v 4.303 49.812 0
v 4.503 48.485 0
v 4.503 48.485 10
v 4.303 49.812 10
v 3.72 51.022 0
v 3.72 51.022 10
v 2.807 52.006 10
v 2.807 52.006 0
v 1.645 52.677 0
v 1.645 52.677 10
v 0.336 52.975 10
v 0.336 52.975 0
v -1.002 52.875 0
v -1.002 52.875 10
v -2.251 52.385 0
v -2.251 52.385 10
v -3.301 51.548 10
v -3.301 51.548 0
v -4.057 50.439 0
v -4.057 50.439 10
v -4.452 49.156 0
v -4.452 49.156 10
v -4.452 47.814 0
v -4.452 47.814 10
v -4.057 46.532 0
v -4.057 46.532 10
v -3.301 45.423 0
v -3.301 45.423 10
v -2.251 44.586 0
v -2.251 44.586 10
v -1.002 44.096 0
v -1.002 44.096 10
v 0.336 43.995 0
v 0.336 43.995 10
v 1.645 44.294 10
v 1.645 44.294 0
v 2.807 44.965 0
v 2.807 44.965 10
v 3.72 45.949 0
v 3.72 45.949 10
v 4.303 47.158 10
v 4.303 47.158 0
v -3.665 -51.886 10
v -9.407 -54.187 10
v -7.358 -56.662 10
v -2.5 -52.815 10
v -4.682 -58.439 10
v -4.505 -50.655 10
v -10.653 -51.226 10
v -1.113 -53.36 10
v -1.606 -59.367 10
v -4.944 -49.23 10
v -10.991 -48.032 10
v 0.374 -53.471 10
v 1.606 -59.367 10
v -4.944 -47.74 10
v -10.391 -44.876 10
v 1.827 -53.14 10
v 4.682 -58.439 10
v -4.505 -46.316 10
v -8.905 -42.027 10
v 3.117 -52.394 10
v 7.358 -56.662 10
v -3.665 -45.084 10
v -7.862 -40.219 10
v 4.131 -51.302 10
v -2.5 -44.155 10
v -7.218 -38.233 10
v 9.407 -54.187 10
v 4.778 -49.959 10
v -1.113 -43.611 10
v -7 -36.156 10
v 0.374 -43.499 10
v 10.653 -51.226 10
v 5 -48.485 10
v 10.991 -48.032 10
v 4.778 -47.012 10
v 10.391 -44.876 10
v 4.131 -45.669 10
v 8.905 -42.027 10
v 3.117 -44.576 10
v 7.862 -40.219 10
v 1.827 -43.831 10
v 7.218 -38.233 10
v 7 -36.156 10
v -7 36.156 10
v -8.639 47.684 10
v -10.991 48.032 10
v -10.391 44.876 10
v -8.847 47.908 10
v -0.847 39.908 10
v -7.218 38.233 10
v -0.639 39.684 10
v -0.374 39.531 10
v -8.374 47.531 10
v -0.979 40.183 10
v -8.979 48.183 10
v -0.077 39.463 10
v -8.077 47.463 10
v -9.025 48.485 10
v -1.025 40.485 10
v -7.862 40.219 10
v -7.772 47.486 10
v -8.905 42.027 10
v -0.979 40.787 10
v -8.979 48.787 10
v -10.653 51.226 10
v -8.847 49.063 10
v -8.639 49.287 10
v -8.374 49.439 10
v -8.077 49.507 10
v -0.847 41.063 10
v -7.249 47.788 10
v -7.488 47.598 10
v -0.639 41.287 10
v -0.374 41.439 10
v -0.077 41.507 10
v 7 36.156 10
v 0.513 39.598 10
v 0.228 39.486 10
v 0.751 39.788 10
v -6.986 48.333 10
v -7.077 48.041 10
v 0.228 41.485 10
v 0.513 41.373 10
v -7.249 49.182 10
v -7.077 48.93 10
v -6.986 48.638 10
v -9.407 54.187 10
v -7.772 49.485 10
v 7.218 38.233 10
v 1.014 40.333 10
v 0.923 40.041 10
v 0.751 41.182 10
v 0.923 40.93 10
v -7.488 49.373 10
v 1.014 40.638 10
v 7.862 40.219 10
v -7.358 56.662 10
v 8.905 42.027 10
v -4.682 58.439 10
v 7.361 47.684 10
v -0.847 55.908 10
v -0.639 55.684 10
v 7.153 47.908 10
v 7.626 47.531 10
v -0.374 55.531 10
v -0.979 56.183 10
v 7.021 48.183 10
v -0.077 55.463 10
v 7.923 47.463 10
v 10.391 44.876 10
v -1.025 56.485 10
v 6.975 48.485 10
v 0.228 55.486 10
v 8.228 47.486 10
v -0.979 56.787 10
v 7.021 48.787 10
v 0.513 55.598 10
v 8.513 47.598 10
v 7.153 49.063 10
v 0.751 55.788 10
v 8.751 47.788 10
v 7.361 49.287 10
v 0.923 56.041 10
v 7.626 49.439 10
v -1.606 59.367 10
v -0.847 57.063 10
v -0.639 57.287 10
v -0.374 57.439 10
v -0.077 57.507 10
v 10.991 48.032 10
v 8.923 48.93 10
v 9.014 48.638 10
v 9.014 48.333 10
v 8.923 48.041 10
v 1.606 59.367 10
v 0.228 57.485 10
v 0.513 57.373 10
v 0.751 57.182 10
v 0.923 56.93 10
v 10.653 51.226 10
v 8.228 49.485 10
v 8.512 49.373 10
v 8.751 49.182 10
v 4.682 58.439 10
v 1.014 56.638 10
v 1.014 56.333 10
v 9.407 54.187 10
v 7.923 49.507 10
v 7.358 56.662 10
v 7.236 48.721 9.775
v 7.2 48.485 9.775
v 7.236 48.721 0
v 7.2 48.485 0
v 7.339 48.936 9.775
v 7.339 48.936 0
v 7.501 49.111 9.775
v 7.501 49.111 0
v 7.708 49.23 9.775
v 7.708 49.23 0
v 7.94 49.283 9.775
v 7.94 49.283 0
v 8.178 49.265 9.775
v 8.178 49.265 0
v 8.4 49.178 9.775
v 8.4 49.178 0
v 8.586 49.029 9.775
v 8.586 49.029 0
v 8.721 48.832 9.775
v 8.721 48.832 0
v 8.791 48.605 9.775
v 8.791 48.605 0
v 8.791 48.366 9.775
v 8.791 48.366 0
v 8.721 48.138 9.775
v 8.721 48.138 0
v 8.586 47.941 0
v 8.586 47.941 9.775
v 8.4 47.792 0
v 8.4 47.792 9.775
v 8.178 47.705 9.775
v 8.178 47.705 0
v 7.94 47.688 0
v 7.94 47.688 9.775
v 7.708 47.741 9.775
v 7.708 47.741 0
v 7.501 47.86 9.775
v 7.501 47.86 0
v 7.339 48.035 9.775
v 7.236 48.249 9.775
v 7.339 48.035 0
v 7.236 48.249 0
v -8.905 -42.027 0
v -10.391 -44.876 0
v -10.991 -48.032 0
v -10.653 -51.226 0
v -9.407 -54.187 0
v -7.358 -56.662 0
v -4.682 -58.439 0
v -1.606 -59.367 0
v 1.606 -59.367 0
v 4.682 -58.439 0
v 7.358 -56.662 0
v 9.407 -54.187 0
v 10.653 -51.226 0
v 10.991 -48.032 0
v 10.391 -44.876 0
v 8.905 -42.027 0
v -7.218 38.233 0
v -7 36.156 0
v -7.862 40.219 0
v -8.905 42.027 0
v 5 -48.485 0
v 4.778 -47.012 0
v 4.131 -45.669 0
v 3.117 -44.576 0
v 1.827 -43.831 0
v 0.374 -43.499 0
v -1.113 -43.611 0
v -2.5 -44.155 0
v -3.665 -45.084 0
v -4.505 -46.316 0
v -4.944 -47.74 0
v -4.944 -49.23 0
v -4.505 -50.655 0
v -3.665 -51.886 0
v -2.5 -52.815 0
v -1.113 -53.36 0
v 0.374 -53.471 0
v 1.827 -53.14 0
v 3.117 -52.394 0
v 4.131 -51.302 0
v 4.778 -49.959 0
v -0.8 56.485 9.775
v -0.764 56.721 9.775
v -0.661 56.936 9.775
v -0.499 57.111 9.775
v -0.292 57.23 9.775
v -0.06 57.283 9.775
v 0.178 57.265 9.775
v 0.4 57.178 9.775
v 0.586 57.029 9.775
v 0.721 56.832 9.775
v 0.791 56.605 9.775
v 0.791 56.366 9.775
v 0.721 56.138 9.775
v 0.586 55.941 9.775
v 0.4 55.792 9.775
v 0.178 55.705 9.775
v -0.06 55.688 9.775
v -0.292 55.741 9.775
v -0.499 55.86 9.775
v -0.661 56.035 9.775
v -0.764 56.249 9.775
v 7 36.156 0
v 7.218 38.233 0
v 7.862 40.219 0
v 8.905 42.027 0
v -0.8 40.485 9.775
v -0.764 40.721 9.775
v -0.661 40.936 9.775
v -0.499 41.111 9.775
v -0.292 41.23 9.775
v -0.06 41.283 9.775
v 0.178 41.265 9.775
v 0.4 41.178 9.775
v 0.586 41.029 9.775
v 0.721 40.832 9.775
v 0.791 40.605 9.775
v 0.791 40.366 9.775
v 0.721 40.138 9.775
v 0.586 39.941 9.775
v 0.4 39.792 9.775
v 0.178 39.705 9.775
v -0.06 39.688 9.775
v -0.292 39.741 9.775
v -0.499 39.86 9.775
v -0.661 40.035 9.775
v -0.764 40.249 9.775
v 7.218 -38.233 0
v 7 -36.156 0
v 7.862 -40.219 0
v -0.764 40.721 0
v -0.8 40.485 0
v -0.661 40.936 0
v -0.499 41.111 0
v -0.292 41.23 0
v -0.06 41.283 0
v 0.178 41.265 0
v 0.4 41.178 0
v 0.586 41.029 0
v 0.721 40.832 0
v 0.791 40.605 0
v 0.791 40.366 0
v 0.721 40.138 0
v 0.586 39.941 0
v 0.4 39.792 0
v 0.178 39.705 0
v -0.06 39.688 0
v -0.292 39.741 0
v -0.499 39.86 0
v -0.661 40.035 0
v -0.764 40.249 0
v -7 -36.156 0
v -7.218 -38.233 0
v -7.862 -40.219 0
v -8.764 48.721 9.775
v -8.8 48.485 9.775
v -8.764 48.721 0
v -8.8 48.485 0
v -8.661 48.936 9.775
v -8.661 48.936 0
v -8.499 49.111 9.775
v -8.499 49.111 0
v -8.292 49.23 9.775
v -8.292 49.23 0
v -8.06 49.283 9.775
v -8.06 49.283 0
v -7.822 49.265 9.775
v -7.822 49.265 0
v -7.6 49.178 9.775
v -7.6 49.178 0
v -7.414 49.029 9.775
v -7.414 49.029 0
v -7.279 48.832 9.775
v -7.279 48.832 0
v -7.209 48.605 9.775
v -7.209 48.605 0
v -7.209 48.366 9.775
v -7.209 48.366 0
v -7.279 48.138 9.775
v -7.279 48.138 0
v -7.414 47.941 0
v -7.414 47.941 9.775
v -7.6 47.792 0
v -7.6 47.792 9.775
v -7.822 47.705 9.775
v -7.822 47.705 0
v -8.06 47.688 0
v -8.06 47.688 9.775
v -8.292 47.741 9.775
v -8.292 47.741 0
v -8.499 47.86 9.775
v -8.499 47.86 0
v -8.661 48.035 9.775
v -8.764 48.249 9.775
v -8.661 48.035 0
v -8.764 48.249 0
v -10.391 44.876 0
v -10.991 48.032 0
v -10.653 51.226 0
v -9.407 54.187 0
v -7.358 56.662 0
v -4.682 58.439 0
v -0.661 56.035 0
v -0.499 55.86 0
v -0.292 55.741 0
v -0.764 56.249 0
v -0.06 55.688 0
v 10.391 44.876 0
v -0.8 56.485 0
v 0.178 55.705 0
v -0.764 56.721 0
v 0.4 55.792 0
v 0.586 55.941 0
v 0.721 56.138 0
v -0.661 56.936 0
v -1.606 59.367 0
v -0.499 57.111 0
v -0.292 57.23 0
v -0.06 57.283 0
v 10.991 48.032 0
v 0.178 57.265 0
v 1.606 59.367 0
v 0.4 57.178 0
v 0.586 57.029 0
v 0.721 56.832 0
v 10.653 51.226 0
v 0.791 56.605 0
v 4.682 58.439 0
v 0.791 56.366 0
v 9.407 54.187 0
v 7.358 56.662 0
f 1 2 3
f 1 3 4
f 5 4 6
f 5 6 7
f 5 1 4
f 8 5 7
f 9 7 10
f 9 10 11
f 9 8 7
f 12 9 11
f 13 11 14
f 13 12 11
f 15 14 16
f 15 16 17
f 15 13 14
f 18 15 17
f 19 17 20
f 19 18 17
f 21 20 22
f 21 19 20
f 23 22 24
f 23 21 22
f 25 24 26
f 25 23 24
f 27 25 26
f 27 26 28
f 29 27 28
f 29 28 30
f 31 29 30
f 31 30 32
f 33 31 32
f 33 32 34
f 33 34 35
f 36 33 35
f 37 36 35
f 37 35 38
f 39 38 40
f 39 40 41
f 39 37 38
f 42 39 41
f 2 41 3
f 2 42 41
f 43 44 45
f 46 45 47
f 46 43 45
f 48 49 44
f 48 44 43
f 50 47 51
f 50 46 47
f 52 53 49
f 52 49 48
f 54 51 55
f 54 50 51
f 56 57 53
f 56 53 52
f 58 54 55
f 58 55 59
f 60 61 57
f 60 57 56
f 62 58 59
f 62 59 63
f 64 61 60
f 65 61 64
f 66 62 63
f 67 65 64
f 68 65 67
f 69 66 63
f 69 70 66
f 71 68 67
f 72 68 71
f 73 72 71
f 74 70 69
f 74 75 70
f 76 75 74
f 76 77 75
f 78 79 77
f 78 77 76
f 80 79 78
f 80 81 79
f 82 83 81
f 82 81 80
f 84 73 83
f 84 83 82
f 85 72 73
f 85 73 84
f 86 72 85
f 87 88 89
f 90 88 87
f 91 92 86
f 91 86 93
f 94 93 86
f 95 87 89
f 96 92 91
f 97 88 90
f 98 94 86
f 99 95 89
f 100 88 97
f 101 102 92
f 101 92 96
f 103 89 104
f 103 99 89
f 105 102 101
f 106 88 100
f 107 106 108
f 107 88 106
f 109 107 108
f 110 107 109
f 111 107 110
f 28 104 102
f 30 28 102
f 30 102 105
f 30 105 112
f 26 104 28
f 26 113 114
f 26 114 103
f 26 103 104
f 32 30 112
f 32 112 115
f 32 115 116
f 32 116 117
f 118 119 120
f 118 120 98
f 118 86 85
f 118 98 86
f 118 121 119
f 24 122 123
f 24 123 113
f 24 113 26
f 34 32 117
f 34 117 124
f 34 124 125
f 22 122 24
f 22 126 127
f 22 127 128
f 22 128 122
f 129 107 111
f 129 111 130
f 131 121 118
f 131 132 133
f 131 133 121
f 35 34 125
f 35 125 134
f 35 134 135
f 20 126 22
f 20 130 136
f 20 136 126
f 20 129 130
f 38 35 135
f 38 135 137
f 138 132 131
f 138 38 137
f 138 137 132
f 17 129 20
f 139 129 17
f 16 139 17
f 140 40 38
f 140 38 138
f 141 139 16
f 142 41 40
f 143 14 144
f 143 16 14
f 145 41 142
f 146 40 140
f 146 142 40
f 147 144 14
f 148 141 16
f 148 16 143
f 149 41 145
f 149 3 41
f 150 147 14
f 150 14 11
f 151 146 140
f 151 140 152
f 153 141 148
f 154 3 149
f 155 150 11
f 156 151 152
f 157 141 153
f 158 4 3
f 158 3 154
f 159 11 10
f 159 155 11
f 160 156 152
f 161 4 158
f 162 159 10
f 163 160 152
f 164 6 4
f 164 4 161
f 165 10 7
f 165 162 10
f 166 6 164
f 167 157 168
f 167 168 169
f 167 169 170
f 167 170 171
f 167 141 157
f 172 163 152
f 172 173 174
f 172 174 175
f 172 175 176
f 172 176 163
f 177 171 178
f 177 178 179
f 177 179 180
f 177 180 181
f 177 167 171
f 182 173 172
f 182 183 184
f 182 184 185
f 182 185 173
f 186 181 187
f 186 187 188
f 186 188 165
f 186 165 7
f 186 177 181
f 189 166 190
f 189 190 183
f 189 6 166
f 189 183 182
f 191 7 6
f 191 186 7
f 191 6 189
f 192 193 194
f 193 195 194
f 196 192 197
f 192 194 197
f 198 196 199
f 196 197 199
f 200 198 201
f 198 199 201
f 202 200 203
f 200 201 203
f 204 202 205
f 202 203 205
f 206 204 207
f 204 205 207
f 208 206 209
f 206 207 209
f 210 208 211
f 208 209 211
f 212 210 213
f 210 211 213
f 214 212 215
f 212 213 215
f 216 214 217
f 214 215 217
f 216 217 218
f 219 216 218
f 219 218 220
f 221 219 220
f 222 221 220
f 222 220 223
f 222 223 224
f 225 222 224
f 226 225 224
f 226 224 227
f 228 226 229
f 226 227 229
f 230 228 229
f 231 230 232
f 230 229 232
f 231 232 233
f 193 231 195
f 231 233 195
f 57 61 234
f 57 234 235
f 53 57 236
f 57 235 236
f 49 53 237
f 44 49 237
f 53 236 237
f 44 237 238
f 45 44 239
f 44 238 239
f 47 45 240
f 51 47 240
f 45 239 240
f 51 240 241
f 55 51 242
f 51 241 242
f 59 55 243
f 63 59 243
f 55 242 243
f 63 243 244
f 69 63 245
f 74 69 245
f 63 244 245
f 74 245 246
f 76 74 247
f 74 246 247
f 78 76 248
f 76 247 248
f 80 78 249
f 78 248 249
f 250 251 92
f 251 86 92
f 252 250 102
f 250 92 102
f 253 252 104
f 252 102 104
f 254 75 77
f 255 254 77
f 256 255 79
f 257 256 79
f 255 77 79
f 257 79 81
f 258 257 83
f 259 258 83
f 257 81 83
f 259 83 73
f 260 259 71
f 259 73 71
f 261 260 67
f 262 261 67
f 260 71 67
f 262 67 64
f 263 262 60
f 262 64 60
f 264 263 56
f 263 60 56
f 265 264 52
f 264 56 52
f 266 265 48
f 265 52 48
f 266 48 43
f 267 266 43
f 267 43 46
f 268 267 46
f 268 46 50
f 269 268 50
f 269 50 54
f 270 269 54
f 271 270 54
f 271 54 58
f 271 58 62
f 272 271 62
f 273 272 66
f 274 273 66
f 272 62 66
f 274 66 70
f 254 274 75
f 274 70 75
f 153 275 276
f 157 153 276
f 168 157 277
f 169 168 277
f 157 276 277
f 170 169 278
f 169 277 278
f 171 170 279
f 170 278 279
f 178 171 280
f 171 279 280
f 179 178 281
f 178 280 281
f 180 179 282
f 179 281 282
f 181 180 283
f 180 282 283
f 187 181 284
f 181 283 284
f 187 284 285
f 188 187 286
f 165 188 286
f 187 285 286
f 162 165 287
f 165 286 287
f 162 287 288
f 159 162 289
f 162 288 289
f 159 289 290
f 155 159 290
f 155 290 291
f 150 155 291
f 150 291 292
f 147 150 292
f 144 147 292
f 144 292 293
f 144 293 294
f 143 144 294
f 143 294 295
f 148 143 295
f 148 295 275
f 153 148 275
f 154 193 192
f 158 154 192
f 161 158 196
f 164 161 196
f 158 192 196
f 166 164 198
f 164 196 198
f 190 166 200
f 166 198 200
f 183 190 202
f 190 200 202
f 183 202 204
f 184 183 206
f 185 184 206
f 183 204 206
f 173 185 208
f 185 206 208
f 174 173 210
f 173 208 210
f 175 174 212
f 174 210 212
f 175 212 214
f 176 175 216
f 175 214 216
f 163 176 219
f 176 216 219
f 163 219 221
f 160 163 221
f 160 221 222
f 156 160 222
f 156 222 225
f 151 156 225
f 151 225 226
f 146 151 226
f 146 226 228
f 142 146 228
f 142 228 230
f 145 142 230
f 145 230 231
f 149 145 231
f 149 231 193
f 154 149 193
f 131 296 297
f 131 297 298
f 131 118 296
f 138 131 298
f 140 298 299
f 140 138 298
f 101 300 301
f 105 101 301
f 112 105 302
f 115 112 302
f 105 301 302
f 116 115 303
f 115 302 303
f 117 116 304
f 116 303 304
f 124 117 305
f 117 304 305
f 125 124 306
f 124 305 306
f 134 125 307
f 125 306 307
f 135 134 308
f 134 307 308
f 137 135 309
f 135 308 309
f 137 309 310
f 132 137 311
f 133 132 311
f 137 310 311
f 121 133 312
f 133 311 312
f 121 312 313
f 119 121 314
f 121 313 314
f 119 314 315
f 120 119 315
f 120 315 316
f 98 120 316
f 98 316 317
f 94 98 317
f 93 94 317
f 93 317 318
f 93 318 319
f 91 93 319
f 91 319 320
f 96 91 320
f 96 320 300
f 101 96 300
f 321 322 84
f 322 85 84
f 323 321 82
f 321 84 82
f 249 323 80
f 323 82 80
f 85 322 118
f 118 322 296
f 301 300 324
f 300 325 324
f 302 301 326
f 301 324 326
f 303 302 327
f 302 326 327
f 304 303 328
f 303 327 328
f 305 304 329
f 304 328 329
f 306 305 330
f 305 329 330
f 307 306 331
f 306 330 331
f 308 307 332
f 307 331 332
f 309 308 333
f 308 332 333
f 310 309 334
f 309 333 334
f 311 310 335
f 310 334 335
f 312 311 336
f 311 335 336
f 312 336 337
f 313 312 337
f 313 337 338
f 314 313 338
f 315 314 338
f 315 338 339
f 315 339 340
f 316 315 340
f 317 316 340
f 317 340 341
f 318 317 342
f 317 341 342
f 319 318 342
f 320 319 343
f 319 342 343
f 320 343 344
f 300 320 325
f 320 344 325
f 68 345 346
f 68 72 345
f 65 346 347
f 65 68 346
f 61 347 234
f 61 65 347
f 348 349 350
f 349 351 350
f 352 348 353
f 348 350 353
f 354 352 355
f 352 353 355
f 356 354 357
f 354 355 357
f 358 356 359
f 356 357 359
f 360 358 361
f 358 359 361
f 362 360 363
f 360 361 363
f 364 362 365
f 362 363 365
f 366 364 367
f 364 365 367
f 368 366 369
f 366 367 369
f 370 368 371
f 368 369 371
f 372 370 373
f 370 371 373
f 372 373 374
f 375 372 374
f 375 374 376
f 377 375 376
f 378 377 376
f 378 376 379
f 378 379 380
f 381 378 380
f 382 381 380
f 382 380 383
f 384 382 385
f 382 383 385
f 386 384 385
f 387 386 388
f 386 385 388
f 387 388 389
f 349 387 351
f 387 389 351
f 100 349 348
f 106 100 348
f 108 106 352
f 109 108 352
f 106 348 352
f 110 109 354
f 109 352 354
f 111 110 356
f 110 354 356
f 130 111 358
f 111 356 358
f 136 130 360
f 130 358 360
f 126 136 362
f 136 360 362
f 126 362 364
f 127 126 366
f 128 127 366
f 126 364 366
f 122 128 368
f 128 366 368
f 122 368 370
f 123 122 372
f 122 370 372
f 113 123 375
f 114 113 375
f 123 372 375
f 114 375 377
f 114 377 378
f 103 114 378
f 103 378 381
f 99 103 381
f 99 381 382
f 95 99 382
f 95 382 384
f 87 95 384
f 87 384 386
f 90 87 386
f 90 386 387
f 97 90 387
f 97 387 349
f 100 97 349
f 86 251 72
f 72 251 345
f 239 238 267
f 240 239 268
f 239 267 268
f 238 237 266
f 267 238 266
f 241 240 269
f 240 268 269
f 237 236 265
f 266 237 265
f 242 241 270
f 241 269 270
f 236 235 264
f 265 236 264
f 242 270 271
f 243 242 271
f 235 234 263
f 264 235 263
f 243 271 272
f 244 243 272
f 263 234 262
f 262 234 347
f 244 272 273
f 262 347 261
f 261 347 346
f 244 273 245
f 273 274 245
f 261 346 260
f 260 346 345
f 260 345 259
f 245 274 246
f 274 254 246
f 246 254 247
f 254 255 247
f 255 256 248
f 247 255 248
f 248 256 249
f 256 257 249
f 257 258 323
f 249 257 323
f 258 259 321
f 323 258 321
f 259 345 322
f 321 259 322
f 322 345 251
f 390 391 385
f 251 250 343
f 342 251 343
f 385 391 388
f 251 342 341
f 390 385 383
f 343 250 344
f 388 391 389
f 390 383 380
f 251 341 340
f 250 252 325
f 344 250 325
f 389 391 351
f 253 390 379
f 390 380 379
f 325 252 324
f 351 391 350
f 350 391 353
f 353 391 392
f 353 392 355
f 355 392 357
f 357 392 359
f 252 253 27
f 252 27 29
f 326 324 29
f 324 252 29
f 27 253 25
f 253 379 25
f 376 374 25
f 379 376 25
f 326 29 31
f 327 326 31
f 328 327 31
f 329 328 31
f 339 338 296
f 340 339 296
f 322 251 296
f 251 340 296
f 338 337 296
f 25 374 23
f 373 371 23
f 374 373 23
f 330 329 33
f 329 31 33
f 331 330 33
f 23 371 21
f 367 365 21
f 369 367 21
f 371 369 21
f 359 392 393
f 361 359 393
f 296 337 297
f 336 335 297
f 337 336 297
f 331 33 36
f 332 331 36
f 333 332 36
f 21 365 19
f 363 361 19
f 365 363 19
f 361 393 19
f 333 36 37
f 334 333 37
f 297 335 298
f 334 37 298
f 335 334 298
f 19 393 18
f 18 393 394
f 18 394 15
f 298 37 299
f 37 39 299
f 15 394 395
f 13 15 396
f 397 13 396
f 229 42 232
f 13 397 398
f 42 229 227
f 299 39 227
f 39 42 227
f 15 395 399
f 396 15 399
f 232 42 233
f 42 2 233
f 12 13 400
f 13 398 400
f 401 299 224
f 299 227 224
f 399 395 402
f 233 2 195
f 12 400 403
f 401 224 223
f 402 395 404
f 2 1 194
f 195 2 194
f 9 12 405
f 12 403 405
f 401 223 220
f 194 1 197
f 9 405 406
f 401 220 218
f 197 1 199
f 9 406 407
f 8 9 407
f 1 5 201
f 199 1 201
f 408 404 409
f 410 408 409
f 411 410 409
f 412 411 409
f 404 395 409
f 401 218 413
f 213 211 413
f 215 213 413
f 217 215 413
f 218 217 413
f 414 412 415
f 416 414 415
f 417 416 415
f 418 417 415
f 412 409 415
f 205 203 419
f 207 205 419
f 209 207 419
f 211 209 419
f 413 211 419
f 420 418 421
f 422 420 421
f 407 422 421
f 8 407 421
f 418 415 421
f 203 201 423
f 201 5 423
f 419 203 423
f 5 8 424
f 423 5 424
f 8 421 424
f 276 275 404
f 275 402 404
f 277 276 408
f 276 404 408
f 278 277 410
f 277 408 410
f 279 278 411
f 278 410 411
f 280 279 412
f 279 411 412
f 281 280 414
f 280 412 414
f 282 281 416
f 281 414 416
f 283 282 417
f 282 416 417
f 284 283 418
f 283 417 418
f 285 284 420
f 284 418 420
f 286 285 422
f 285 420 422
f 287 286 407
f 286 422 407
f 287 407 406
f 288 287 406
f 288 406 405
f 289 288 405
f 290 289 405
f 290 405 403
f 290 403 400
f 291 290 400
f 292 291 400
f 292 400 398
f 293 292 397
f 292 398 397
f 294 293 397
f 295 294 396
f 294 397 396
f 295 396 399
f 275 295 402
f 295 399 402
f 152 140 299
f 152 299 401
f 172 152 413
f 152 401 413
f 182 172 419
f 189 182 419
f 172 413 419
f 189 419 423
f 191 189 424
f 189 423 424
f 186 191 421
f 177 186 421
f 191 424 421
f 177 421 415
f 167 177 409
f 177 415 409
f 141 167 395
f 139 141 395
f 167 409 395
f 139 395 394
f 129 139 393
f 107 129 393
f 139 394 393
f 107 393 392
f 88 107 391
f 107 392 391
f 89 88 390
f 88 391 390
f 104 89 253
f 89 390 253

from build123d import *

# Parameters (mm, degrees)
ESQUISSE1_R                 = 4.502635458
BOSS_EXTRU_1_DEPTH          = 10
TROU_TARAUD_M22_D           = 1.6
TROU_TARAUD_M22_CSINK_D     = 2.05
TROU_TARAUD_M22_CSINK_ANGLE = 90
CONG_1_R                    = 10
ESQUISSE9_R                 = 5
ENL_V_MAT_EXTRU_1_DEPTH     = 10


with BuildPart() as part:
    # Esquisse1 → Boss.-Extru.1 (new body)
    with BuildSketch(Plane.XY):
        with BuildLine():
            Line((-7, 40), (-7, -40))
            ThreePointArc((-7, -40), (0, -59.485281374), (7, -40))
            Line((7, -40), (7, 40))
            ThreePointArc((7, 40), (0, 59.485281374), (-7, 40))
        make_face()
        with Locations((0, 48.485281374)):
            Circle(ESQUISSE1_R, mode=Mode.SUBTRACT)
    extrude(amount=BOSS_EXTRU_1_DEPTH)

    # Trou taraudé M22 (through all)
    with Locations(Plane.XY.offset(10)):
        with Locations((-8, 48.485281374), (0, 56.485281374), (8, 48.485281374), (0, 40.485281374)):
            CounterSinkHole(TROU_TARAUD_M22_D / 2, TROU_TARAUD_M22_CSINK_D / 2, counter_sink_angle=TROU_TARAUD_M22_CSINK_ANGLE)

    # Congé1
    cong_1_edges = [part.edges().sort_by_distance(p)[0] for p in [
        (7, 40, 5),
        (7, -40, 5),
        (-7, -40, 5),
        (-7, 40, 5),
    ]]
    fillet(cong_1_edges, radius=CONG_1_R)

    # Esquisse9 → Enlèv. mat.-Extru.1 (cut)
    with BuildSketch(Plane.XY.offset(10)):
        with Locations((0, -48.485281374)):
            Circle(ESQUISSE9_R)
    extrude(amount=-ENL_V_MAT_EXTRU_1_DEPTH, mode=Mode.SUBTRACT)


solid = part.part
